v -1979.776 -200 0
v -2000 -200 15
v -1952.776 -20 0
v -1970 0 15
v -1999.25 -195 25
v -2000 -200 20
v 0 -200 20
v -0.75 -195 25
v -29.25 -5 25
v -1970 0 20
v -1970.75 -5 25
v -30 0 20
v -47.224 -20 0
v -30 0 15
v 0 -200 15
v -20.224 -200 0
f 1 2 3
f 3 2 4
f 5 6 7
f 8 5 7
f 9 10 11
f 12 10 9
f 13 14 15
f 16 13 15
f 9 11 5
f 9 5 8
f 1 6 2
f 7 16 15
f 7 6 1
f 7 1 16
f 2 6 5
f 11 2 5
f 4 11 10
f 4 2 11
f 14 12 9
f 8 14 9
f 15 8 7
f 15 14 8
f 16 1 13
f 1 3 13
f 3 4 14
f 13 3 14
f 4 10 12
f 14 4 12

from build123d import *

# Parameters (mm, degrees)
F0_W     = 2000
F0_H     = 25
F1_DEPTH = 200
F2_SIZE  = 5
F4_DEPTH = 153
F5_SIZE2 = 15
F5_SIZE  = 20


with BuildPart() as f1:
    # F0 (on Front) → F1 (new body)
    with BuildSketch(Plane.XZ):
        with Locations((-1000, 12.5)):
            Rectangle(F0_W, F0_H)
    extrude(amount=F1_DEPTH)

    # F2
    f2_edges = [f1.edges().sort_by_distance(p)[0] for p in [
        (-1000, -200, 25),
        (-1000, 0, 25),
    ]]
    chamfer(f2_edges, length=F2_SIZE)

    # F3 (on Top) → F4 (cut)
    with BuildSketch(Plane.XY):
        Polygon((0, -200), (0, 0), (-30, 0), align=None)
        Polygon((-2000, 0), (-2000, -200), (-1970, 0), align=None)
    extrude(amount=F4_DEPTH, mode=Mode.SUBTRACT)

    # F5
    f5_edges = [f1.edges().sort_by_distance(p)[0] for p in [
        (-1000, 0, 0),
        (-15, -100, 0),
        (-1985, -100, 0),
    ]]
    f5_side = f1.faces().sort_by_distance((-1000, -100.507614, 0))[0]
    chamfer(f5_edges, length=F5_SIZE, length2=F5_SIZE2, reference=f5_side)


solid = f1.part
